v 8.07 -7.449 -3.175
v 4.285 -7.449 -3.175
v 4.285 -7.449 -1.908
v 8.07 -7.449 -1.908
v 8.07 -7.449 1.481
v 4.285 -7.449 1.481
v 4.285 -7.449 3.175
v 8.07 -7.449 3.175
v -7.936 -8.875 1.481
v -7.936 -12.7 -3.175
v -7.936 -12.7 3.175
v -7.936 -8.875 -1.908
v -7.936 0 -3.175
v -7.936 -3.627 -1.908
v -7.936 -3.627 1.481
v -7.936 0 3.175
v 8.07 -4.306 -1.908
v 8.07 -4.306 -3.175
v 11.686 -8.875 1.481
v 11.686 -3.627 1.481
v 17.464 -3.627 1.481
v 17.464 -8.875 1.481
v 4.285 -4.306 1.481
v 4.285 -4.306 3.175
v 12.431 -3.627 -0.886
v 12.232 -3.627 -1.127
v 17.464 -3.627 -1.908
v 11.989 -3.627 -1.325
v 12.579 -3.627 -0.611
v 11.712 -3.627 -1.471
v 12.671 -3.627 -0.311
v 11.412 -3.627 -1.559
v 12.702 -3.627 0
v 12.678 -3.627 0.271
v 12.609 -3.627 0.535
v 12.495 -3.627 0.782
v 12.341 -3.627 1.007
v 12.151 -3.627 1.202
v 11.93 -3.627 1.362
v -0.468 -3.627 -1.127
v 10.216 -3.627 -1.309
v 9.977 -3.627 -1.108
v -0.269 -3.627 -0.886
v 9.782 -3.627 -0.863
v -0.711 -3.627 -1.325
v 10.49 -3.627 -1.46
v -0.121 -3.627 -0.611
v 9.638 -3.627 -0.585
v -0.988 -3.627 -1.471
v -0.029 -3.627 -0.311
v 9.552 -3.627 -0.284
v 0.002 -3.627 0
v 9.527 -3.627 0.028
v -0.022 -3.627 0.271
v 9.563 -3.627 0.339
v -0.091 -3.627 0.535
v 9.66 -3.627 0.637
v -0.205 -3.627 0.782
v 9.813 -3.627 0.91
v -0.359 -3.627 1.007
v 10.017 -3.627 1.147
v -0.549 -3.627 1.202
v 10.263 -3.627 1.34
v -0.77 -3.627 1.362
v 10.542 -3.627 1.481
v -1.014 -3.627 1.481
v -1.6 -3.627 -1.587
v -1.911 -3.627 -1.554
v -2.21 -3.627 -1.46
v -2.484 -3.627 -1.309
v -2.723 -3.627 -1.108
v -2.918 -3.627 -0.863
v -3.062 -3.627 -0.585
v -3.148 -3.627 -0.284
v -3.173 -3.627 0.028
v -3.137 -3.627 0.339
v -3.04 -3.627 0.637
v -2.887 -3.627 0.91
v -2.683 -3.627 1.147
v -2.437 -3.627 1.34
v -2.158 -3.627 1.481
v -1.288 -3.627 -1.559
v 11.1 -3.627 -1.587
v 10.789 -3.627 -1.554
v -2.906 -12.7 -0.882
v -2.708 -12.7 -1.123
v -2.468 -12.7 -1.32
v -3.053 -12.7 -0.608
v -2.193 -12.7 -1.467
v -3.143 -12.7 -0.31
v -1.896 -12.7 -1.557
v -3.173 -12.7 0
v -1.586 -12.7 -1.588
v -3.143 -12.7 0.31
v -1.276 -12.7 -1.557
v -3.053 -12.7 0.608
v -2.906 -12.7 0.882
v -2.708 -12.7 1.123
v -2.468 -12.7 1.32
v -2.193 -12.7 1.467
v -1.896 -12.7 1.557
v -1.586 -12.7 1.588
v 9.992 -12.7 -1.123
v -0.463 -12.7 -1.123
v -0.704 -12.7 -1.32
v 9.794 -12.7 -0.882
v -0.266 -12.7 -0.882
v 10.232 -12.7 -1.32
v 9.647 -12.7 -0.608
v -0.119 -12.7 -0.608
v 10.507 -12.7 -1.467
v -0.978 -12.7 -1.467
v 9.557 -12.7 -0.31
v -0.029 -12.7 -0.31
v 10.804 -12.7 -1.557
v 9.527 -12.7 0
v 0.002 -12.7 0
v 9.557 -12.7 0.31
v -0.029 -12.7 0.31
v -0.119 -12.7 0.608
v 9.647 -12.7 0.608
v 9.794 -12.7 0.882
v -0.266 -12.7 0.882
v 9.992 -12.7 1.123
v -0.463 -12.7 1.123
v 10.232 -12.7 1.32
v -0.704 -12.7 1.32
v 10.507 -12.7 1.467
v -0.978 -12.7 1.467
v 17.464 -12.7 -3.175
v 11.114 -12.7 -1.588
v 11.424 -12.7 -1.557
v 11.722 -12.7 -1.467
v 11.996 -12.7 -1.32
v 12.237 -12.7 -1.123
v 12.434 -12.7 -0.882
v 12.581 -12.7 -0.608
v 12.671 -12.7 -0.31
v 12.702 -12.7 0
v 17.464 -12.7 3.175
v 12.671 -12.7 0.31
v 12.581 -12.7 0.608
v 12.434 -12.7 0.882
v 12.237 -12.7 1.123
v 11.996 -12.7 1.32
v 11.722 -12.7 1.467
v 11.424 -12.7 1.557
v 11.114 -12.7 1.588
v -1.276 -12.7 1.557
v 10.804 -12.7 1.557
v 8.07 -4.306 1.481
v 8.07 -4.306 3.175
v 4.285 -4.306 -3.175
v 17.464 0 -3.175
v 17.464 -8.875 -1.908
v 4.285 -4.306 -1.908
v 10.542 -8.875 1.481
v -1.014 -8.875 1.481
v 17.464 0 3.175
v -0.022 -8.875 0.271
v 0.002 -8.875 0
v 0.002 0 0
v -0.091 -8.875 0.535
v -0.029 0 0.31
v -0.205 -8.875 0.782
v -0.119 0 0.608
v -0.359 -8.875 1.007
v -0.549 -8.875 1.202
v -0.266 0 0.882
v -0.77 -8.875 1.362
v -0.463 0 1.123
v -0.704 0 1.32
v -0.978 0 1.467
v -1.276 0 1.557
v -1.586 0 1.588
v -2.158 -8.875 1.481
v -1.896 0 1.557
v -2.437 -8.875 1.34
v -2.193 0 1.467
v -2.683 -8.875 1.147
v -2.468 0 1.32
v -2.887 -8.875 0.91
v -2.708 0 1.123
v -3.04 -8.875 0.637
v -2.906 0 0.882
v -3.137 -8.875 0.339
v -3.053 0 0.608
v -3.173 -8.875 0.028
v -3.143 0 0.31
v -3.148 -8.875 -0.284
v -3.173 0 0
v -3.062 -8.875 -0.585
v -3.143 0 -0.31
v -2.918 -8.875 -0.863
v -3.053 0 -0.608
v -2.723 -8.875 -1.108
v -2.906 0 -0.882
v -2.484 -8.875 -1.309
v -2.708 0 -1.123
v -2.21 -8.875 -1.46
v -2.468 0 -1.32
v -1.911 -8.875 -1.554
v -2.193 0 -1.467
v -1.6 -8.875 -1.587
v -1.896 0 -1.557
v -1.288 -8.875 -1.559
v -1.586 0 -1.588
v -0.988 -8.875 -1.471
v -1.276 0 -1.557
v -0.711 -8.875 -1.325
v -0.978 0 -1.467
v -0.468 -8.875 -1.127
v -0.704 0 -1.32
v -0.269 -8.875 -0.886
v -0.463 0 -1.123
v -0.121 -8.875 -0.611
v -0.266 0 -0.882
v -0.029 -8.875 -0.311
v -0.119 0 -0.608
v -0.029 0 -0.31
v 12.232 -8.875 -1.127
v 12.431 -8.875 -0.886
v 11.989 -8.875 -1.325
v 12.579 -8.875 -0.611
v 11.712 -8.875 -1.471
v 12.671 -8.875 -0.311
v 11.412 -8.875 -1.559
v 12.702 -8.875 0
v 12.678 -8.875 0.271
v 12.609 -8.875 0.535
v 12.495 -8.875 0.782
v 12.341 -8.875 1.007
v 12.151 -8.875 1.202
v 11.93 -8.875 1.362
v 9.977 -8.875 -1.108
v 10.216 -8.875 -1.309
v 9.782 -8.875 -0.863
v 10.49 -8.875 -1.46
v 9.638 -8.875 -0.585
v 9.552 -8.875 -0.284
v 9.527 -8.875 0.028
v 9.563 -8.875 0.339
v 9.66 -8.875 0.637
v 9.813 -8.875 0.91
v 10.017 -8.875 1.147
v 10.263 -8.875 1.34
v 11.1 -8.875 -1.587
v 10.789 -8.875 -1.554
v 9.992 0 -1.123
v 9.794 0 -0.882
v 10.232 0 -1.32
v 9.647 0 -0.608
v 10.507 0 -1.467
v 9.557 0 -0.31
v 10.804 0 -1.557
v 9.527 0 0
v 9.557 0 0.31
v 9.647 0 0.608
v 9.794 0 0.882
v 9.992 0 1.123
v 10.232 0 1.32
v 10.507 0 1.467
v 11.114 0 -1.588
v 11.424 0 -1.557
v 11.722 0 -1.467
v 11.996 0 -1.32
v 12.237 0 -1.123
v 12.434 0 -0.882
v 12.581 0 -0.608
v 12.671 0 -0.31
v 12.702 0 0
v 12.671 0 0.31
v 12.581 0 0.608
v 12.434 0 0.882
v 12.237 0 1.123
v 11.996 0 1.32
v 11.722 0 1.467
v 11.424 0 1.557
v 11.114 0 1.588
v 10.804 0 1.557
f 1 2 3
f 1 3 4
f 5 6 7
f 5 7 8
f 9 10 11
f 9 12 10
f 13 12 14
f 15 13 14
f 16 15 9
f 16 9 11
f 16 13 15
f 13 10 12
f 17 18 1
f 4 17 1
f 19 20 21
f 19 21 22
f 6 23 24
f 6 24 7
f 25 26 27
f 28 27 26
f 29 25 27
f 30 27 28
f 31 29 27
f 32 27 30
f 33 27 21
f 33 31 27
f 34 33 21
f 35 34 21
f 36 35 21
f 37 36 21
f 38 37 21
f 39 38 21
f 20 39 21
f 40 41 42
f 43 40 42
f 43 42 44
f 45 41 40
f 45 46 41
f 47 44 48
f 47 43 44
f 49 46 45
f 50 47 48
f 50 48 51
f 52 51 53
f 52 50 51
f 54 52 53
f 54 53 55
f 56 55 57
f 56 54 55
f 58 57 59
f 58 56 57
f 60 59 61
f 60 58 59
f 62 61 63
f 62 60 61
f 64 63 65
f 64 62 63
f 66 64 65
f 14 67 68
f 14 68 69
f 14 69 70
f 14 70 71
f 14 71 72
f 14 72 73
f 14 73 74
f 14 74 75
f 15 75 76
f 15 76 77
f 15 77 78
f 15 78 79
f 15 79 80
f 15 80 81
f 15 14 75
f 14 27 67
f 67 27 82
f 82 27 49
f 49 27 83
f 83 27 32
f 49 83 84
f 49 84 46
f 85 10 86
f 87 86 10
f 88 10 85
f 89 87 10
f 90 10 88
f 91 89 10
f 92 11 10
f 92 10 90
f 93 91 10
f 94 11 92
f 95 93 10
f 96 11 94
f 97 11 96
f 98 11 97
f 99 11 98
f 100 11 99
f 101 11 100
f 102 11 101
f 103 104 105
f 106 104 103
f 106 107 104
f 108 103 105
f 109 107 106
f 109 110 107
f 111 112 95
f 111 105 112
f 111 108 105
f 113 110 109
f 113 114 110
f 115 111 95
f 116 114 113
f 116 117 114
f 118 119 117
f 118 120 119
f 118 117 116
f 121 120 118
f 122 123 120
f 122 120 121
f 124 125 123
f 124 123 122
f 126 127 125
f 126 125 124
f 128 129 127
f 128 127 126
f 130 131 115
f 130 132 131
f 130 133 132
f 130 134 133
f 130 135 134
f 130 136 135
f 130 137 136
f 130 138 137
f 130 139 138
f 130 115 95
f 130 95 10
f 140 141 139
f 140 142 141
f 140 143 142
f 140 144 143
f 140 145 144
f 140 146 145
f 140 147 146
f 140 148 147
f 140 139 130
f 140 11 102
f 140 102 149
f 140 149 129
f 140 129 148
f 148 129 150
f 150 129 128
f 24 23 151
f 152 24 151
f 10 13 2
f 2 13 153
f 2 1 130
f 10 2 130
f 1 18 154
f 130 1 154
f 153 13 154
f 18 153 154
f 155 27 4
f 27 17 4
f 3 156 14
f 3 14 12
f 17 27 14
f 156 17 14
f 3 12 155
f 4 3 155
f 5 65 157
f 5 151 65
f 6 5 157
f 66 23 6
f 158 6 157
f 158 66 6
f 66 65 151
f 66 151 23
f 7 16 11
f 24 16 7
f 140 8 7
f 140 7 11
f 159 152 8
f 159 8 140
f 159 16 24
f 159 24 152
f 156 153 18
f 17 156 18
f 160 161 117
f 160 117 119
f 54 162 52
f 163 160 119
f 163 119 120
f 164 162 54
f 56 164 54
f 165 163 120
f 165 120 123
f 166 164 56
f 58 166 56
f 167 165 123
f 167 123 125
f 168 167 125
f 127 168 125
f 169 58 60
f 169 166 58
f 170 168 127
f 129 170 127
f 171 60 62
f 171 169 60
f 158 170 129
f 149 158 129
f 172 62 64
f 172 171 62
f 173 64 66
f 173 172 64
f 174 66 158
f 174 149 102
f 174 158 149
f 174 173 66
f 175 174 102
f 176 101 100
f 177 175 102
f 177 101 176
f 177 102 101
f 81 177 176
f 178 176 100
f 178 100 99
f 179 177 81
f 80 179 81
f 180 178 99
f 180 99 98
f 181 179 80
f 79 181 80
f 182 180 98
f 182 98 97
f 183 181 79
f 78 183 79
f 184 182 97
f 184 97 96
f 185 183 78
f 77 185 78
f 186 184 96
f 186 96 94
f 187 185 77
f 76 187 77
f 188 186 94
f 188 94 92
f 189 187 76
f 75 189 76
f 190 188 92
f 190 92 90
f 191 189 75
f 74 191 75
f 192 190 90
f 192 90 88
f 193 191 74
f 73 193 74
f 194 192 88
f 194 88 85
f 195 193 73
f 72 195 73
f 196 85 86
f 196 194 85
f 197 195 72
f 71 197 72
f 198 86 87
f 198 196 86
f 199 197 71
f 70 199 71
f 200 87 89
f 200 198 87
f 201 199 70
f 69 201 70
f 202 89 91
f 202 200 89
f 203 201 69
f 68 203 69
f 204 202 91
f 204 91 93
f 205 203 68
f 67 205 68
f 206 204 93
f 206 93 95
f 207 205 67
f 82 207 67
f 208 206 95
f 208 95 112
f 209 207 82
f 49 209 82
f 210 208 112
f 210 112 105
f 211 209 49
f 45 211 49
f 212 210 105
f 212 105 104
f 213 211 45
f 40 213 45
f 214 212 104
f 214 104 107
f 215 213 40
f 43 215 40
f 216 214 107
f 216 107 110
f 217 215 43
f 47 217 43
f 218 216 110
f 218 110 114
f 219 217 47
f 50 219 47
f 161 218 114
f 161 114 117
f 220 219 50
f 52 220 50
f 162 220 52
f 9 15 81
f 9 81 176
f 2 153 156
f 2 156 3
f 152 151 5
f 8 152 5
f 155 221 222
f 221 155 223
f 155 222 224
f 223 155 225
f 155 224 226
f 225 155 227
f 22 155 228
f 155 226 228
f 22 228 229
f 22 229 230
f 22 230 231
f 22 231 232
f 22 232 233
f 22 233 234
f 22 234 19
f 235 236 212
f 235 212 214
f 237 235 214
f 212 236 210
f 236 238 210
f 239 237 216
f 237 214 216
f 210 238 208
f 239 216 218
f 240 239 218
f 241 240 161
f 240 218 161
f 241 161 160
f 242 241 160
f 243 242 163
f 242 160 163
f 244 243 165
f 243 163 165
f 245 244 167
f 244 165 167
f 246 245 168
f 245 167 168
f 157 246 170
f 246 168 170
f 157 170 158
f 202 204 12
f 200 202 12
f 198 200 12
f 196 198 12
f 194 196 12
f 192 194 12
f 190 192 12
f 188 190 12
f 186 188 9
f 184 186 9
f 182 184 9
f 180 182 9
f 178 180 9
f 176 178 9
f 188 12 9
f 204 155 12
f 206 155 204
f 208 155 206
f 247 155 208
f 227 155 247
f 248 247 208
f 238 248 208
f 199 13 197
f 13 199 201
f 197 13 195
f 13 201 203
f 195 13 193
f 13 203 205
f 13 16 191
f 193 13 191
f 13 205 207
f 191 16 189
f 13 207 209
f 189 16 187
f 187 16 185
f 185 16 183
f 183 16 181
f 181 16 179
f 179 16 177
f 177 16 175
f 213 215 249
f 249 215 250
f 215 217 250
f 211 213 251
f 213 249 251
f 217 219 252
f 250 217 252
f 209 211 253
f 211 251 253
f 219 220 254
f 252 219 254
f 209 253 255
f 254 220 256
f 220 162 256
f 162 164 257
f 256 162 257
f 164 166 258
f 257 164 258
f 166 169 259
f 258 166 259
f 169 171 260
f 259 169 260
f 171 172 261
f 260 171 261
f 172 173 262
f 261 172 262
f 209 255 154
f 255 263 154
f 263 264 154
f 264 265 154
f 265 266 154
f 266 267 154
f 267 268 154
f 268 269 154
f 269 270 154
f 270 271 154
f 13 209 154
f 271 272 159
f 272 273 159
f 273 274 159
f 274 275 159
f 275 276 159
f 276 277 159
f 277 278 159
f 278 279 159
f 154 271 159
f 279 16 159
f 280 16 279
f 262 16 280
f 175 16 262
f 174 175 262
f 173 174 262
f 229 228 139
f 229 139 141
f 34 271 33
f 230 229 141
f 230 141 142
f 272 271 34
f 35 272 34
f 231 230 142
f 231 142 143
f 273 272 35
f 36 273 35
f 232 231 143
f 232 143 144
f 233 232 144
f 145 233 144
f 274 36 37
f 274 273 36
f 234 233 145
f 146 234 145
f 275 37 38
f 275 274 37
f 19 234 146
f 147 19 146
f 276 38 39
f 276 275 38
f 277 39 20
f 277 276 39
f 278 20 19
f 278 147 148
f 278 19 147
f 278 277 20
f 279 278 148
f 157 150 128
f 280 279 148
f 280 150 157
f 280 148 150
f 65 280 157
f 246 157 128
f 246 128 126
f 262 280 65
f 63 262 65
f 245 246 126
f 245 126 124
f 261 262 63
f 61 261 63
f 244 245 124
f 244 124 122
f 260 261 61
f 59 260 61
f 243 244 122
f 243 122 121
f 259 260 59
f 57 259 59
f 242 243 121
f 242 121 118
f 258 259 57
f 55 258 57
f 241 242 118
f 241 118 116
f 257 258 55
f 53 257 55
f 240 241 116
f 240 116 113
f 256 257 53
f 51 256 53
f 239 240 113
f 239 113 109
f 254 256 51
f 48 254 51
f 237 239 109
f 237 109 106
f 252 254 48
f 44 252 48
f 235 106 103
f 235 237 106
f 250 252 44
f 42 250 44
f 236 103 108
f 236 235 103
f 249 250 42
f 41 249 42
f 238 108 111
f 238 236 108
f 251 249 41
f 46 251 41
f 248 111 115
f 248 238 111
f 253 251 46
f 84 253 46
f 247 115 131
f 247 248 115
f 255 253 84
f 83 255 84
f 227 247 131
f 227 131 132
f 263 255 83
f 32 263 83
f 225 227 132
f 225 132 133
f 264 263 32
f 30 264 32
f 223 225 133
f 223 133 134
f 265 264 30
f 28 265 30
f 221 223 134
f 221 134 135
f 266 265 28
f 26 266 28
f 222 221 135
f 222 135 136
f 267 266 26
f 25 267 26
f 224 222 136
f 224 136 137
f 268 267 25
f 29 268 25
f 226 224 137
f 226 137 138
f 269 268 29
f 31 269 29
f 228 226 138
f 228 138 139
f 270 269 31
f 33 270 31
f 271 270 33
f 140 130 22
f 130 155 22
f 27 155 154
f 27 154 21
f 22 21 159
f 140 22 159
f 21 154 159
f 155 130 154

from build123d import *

# Parameters (mm, degrees)
F0_W     = 25.4
F0_H     = 6.35
F0_R     = 1.5875
F1_DEPTH = 12.7
F2_W     = 3.784558
F2_H     = 3.142819
F3_DEPTH = 25.4
F4_W     = 5.247167
F4_H     = 3.388975
F5_DEPTH = 25.4
F6_R     = 2.113267
F7_DEPTH = 25.4


with BuildPart() as f1:
    # F0 (on Front) → F1 (new body)
    with BuildSketch(Plane.XZ):
        with Locations((4.764033, 0)):
            Rectangle(F0_W, F0_H)
        with Locations((-1.585967, 0)):
            Circle(F0_R, mode=Mode.SUBTRACT)
        with Locations((11.114033, 0)):
            Circle(F0_R, mode=Mode.SUBTRACT)
    extrude(amount=F1_DEPTH)

    # F2 (on face) → F3 (cut)
    with BuildSketch(Plane(origin=(0, 0, -3.175), x_dir=(1, 0, 0), z_dir=(0, 0, -1))):
        with Locations((6.177249, 5.877707)):
            Rectangle(F2_W, F2_H)
    extrude(amount=-F3_DEPTH, mode=Mode.SUBTRACT)

    # F4 (on face) → F5 (cut)
    with BuildSketch(Plane(origin=(-7.935967, 0, 0), x_dir=(0, -1, 0), z_dir=(-1, 0, 0))):
        with Locations((6.250942, -0.213469)):
            Rectangle(F4_W, F4_H)
    extrude(amount=-F5_DEPTH, mode=Mode.SUBTRACT)

    # F6 (on face) → F7 (cut)
    with BuildSketch(Plane.XZ):
        with Locations((5.720744, 0)):
            Circle(F6_R)
    extrude(amount=-F7_DEPTH, mode=Mode.SUBTRACT)


solid = f1.part
